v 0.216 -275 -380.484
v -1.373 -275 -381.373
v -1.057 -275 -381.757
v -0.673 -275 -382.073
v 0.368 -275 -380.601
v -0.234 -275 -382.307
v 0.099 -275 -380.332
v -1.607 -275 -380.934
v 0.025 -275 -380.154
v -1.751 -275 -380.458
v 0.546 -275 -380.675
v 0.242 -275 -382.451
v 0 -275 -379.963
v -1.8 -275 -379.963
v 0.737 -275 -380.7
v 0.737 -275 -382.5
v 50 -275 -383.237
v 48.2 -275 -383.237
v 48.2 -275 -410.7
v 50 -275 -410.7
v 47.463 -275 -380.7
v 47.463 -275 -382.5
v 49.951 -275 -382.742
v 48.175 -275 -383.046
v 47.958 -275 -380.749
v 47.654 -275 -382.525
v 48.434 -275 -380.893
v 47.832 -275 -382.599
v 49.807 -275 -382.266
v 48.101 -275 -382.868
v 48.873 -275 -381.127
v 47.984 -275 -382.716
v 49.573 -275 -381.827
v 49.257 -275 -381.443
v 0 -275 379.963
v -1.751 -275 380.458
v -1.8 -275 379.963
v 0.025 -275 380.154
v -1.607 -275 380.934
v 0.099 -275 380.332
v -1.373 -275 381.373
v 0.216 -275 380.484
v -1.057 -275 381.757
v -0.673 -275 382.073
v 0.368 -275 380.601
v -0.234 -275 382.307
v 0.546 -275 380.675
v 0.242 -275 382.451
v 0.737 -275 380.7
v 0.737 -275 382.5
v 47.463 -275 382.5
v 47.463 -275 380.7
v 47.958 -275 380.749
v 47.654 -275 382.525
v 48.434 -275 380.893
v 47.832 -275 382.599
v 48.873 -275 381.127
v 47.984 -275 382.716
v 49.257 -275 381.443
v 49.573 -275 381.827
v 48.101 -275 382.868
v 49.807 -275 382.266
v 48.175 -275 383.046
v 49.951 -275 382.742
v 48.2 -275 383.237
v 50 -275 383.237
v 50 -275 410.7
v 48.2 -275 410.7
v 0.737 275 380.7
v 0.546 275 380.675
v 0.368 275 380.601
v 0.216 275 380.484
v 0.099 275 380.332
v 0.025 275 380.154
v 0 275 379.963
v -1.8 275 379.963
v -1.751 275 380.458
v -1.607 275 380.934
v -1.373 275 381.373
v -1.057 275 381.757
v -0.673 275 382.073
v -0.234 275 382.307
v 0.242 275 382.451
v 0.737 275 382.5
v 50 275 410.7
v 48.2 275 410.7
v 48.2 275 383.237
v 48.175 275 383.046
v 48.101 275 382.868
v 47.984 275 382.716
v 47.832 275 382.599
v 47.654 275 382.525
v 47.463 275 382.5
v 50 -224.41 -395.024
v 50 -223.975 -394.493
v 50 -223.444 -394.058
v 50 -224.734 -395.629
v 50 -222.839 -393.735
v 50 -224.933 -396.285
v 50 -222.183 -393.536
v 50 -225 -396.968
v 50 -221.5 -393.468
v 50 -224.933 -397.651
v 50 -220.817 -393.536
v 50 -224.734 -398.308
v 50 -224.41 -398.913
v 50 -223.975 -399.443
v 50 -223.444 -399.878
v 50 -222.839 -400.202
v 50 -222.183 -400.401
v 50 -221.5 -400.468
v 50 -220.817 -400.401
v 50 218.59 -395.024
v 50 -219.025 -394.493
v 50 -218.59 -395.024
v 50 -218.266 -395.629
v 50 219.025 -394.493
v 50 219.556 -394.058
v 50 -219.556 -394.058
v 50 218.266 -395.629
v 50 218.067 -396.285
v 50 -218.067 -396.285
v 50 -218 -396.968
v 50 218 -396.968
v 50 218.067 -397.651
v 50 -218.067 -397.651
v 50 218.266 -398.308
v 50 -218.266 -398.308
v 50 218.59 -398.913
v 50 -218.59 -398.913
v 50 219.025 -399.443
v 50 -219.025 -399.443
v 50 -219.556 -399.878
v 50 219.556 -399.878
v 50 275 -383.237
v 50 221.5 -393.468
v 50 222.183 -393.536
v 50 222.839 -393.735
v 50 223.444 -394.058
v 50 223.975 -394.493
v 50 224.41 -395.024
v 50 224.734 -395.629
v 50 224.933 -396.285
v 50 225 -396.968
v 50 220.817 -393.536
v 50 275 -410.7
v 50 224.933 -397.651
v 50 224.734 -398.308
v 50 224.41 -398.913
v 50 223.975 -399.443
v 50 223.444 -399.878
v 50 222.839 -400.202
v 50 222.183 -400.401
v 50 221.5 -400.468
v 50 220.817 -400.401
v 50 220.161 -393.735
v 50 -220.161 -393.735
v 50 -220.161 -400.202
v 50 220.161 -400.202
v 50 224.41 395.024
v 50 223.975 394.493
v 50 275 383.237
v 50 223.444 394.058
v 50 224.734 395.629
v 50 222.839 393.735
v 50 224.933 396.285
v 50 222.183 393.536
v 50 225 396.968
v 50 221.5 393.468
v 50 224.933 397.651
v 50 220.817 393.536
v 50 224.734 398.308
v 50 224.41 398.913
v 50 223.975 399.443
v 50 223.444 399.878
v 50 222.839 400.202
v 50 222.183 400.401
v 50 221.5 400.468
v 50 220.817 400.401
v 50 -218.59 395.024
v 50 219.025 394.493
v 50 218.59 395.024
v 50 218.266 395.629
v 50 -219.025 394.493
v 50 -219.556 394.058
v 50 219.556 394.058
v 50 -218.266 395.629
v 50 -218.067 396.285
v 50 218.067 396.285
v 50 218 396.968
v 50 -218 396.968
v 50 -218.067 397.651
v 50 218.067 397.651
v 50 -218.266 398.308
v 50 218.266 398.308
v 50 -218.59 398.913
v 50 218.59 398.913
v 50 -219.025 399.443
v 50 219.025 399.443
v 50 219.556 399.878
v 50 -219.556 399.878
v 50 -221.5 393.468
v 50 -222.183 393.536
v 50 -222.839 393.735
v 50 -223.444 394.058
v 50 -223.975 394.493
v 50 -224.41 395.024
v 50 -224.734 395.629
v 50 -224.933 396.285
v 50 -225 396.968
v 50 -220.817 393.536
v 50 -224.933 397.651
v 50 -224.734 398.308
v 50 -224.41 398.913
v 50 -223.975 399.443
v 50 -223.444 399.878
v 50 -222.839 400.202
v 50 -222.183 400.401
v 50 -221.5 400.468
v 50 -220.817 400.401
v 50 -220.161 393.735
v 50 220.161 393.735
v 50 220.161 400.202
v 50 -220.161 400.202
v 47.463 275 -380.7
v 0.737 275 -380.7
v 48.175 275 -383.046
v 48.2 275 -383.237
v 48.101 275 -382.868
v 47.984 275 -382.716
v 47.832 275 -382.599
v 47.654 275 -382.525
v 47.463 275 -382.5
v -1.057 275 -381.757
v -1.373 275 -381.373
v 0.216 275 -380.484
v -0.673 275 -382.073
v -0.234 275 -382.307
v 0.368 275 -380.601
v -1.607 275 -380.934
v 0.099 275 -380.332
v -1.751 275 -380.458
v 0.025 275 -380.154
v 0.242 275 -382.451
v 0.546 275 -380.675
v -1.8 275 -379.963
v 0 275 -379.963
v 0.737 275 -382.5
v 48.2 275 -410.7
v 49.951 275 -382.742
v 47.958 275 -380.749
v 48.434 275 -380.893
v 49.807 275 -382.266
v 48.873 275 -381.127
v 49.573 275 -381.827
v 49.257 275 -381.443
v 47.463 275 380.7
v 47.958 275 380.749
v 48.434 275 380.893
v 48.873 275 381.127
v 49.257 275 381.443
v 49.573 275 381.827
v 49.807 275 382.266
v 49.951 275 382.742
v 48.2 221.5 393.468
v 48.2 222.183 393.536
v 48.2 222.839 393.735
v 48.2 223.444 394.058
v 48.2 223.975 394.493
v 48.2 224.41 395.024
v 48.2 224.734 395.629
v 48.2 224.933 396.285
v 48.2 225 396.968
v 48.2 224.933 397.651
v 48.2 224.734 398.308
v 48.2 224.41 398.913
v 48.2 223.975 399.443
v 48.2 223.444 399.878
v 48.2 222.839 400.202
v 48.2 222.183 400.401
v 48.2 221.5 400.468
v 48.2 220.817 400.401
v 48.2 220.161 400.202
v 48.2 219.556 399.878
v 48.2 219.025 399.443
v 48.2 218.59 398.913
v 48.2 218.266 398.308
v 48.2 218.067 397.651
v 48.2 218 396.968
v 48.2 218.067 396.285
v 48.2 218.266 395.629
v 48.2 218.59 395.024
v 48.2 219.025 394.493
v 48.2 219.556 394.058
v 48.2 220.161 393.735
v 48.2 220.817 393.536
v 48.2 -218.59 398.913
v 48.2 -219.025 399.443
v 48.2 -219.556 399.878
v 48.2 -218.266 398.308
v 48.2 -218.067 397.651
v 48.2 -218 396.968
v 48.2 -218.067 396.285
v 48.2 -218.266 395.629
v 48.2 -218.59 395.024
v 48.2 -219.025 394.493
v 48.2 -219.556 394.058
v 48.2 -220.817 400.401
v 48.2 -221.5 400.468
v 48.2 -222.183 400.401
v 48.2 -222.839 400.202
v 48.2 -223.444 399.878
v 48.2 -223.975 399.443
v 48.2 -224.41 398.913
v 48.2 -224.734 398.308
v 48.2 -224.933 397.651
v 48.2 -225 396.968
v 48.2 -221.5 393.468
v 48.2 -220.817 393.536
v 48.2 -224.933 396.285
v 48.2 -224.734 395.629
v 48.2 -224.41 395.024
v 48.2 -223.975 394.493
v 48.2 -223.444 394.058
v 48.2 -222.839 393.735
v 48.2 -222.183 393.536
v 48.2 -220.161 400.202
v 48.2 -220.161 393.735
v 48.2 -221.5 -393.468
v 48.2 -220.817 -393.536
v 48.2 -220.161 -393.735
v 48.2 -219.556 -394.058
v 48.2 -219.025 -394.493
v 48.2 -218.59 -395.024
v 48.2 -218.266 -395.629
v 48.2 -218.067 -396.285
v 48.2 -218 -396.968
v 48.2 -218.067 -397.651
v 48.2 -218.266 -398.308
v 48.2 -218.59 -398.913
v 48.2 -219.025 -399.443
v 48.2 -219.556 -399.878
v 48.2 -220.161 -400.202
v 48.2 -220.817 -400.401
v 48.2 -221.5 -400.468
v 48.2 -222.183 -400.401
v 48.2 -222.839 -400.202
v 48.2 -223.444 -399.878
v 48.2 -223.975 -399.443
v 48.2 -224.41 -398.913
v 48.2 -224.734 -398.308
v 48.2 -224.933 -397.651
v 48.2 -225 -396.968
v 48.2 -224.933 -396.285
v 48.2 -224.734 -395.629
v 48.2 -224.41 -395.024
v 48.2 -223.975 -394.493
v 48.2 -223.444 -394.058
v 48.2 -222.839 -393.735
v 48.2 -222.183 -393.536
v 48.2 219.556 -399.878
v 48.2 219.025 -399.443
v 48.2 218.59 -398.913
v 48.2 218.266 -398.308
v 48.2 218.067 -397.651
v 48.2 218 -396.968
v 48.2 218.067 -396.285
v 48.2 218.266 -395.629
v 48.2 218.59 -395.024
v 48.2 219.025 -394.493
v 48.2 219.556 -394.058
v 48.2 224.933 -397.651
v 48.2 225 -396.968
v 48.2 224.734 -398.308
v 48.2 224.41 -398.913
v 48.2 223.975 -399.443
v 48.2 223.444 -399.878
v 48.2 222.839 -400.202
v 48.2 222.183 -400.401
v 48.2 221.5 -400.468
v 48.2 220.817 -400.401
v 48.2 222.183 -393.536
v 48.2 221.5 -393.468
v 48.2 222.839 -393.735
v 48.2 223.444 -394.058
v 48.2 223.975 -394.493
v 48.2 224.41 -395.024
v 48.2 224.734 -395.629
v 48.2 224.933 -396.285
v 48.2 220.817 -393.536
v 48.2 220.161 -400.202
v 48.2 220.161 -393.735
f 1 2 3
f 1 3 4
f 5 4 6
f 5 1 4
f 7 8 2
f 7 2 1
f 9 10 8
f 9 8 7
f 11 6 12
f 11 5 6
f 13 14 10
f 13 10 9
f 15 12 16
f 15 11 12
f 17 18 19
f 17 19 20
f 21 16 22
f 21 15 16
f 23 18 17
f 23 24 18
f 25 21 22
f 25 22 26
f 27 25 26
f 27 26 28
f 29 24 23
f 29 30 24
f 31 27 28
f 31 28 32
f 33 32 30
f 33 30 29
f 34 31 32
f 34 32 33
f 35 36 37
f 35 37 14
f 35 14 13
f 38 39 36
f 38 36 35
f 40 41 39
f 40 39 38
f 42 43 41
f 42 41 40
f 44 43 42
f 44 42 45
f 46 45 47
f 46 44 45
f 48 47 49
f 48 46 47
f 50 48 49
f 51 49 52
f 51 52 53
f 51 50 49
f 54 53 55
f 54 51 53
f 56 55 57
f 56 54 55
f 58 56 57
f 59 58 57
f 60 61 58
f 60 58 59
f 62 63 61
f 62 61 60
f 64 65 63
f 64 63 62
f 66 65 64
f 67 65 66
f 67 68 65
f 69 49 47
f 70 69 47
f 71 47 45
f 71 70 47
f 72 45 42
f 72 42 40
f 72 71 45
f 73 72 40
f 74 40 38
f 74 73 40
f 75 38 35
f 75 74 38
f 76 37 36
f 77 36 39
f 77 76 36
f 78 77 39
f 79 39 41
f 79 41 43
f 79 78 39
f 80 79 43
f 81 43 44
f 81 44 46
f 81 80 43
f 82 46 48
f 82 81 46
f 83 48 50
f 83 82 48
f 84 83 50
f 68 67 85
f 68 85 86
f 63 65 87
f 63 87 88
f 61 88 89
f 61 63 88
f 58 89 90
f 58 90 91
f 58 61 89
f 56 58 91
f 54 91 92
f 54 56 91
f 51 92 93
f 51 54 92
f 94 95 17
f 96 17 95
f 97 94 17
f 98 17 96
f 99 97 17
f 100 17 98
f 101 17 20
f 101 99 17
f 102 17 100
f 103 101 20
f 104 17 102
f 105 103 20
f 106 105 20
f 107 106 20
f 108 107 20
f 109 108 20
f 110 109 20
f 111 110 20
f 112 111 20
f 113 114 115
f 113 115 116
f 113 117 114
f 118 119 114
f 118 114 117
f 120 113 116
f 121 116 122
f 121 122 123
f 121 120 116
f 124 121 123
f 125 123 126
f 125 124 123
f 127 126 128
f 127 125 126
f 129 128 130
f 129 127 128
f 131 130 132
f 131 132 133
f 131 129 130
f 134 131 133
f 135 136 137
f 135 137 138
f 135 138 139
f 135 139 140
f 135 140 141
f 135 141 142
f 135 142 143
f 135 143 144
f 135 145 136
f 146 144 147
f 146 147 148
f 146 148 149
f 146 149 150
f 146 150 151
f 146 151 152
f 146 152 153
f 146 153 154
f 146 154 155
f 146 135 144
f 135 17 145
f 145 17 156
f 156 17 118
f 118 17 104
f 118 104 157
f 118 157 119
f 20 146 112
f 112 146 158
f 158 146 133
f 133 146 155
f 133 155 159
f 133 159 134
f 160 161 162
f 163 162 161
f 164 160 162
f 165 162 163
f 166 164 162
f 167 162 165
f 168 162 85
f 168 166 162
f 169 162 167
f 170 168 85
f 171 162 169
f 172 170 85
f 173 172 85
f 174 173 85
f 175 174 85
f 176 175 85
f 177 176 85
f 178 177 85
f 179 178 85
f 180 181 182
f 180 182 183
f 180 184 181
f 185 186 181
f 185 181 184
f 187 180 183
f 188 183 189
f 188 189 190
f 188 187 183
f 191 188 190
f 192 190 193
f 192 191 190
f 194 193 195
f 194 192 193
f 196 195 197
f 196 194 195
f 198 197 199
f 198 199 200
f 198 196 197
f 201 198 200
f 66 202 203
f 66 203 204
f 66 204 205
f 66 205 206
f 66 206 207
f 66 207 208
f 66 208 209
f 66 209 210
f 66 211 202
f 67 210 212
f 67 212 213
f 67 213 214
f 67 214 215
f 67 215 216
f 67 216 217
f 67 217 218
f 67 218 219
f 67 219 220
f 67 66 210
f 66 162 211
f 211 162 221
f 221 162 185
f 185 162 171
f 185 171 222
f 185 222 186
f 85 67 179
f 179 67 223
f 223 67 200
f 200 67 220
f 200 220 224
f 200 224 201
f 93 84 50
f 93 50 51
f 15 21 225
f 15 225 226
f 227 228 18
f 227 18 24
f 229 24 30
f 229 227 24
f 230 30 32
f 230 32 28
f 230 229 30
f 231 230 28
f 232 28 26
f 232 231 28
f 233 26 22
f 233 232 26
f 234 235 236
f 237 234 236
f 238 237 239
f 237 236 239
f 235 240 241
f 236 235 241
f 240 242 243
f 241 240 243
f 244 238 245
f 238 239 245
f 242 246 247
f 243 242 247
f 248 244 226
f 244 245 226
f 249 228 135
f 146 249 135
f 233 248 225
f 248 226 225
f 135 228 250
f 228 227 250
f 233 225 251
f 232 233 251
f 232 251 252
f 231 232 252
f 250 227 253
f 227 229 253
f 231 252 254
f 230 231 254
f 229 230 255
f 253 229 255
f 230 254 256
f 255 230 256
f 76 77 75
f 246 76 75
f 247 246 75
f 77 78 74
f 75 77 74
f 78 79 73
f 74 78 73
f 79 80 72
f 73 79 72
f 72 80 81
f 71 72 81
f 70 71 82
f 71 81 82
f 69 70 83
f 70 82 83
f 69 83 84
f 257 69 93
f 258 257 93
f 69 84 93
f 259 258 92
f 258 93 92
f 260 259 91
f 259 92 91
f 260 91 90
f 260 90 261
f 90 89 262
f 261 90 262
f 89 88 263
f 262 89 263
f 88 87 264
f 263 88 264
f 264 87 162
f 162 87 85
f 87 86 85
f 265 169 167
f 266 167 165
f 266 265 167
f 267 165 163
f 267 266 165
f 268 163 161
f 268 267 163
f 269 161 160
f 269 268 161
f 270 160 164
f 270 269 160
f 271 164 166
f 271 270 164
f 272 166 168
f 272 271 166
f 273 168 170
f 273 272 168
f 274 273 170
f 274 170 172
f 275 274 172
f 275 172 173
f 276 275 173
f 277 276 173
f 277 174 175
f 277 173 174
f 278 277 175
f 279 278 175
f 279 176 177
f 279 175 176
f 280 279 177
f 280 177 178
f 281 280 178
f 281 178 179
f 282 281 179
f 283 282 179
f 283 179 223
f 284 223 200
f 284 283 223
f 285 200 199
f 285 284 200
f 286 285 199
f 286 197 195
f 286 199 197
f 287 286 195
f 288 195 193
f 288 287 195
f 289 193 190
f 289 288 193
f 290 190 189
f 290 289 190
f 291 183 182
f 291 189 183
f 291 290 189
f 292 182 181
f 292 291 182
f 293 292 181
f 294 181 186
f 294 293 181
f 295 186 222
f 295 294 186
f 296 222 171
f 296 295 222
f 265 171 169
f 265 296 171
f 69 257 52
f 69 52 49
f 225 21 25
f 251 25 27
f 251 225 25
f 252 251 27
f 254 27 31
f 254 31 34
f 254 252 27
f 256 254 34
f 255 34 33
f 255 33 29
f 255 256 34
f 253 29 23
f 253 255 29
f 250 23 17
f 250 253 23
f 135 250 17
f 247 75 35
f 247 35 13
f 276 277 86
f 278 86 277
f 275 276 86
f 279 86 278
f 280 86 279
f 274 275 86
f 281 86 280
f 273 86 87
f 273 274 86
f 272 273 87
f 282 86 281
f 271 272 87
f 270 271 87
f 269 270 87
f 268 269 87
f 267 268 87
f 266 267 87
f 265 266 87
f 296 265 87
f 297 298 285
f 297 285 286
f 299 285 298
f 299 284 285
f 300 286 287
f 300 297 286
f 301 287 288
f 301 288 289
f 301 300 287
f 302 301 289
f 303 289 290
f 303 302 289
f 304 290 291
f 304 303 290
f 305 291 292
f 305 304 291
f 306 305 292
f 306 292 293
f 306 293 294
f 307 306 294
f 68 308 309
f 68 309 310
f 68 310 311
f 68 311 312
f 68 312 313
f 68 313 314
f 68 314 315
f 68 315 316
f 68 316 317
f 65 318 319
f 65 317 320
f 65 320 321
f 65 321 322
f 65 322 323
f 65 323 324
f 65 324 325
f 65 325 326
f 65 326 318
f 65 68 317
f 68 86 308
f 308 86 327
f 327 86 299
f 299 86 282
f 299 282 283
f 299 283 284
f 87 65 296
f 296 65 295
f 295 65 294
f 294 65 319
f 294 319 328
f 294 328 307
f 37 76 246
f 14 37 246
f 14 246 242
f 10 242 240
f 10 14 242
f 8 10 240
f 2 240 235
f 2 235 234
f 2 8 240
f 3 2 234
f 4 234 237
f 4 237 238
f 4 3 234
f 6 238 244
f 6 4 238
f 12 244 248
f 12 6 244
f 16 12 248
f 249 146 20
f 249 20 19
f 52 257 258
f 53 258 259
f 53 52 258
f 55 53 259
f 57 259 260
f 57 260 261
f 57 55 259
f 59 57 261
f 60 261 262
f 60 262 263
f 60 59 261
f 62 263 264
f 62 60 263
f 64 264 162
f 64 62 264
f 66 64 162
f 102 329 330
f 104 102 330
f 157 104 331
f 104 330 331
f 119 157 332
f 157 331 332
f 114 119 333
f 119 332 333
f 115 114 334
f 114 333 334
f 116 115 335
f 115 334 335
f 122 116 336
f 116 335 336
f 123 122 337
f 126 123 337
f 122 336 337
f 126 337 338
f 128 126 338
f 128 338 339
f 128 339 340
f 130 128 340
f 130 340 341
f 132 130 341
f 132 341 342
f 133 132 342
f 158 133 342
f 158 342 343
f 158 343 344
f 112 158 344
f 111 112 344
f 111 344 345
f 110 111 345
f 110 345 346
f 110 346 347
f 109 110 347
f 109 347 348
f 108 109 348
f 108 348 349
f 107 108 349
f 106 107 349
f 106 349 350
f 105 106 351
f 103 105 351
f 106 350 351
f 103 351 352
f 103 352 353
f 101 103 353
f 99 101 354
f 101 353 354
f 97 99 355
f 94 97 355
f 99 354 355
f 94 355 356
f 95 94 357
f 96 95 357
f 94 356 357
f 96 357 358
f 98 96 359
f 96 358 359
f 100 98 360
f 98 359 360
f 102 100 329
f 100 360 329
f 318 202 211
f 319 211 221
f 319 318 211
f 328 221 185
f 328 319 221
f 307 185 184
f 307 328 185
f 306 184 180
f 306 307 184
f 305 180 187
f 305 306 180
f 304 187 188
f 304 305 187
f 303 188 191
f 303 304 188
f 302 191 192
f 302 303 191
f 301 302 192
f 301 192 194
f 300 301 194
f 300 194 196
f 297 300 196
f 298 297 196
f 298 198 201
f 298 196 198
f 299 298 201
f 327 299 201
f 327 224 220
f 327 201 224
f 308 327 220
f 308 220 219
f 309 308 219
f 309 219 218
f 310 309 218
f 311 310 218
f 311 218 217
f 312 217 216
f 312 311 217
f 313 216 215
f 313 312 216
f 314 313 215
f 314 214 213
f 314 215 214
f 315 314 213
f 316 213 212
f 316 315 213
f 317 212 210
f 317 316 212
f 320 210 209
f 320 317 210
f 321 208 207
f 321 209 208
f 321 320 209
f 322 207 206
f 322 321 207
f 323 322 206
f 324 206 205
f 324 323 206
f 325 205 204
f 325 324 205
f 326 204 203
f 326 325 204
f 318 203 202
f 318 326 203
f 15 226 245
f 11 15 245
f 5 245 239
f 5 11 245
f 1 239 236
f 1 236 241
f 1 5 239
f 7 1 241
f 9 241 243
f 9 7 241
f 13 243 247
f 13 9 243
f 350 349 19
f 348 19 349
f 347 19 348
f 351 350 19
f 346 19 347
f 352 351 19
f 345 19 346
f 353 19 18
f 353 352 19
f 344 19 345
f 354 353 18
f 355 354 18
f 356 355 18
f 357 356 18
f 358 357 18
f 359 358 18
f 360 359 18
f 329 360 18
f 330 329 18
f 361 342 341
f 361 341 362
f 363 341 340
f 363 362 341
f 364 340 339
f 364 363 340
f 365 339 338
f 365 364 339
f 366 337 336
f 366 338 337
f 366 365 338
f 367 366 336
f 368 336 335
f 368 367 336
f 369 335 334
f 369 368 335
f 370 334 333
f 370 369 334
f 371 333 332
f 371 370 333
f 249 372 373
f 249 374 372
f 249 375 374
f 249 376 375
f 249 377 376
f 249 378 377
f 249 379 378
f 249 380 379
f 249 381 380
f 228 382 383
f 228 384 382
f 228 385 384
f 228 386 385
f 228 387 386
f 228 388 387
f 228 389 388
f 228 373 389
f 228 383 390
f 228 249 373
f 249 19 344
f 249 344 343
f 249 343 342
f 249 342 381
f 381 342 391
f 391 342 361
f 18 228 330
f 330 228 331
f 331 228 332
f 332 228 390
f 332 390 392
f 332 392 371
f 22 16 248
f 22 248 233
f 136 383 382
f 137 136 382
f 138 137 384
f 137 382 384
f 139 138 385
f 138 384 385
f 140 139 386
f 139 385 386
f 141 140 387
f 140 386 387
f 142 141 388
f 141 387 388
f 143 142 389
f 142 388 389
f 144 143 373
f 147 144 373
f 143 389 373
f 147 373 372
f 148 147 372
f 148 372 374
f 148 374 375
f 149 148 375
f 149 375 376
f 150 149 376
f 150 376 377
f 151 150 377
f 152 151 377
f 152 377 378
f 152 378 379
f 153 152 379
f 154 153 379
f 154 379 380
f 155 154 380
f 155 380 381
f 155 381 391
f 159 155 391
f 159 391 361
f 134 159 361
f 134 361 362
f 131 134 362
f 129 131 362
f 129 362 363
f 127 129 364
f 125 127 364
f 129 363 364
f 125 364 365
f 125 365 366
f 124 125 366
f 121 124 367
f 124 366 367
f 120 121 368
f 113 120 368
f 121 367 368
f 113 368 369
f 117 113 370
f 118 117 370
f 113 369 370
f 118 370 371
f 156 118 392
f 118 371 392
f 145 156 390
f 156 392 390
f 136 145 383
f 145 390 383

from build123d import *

# Parameters (mm, degrees)
SKETCH1_W                      = 765
SKETCH1_H                      = 550
BASE_FLANGE1_DEPTH             = 1.8
EDGE_FLANGE1_STRIP_W           = 8.6732
EDGE_FLANGE1_STRIP_H           = 1.8
EDGE_FLANGE1_STRIP_CUT_DEPTH   = 550
EDGE_FLANGE1_STRIP_2_W         = 8.6732
EDGE_FLANGE1_STRIP_2_H         = 1.8
EDGE_FLANGE1_STRIP_CUT_2_DEPTH = 550
EDGE_FLANGE1_DEPTH             = 550
EDGE_FLANGE1_BEND_DEPTH        = 550
EDGE_FLANGE2_STRIP_W           = 8.6732
EDGE_FLANGE2_STRIP_H           = 1.8
EDGE_FLANGE2_STRIP_CUT_DEPTH   = 550
EDGE_FLANGE2_STRIP_2_W         = 8.6732
EDGE_FLANGE2_STRIP_2_H         = 1.8
EDGE_FLANGE2_STRIP_CUT_2_DEPTH = 550
EDGE_FLANGE2_DEPTH             = 550
EDGE_FLANGE2_BEND_DEPTH        = 550
SKETCH18_R                     = 3.5
CUT_EXTRUDE1_DEPTH             = 10


# Sheet-metal steps are written as plain solids
with BuildPart() as part:
    # Sketch1 → Base-Flange1 (new body)
    with BuildSketch(Plane(origin=(0, 0, 0), x_dir=(0, 0, -1), z_dir=(1, 0, 0))):
        Rectangle(SKETCH1_W, SKETCH1_H)
    extrude(amount=-BASE_FLANGE1_DEPTH)

    # Edge-Flange1 strip (across the edge) → Edge-Flange1 strip cut (cut)
    with BuildSketch(Plane(origin=(0, 275, 382.5), x_dir=(0, 0, -1), z_dir=(0, -1, 0))):
        with Locations((-1.8, -0.9)):
            Rectangle(EDGE_FLANGE1_STRIP_W, EDGE_FLANGE1_STRIP_H)
    extrude(amount=EDGE_FLANGE1_STRIP_CUT_DEPTH, mode=Mode.SUBTRACT)

    # Edge-Flange1 strip 2 (across the edge) → Edge-Flange1 strip cut 2 (cut)
    with BuildSketch(Plane(origin=(0, -275, -382.5), x_dir=(0, 0, 1), z_dir=(0, 1, 0))):
        with Locations((-1.8, -0.9)):
            Rectangle(EDGE_FLANGE1_STRIP_2_W, EDGE_FLANGE1_STRIP_2_H)
    extrude(amount=EDGE_FLANGE1_STRIP_CUT_2_DEPTH, mode=Mode.SUBTRACT)

    # Edge-Flange1 section (across the edge) → Edge-Flange1 (add)
    with BuildSketch(Plane(origin=(0, 275, 382.5), x_dir=(0, 0, -1), z_dir=(0, -1, 0))):
        with BuildLine():
            Line((0, 0.7366), (0, 48.2))
            Line((0, 48.2), (1.8, 48.2))
            Line((1.8, 48.2), (1.8, 0.7366))
            ThreePointArc((1.8, 0.7366), (2.015745145, 0.215745145), (2.5366, 0))
            Line((2.5366, 0), (2.5366, -1.8))
            ThreePointArc((2.5366, -1.8), (0.742952939, -1.057047061), (0, 0.7366))
        make_face()
    extrude(amount=EDGE_FLANGE1_DEPTH)

    # Edge-Flange1 section 2 (across the edge) → Edge-Flange1 bend (add)
    with BuildSketch(Plane(origin=(0, -275, -382.5), x_dir=(0, 0, 1), z_dir=(0, 1, 0))):
        with BuildLine():
            Line((0, 0.7366), (0, 48.2))
            Line((0, 48.2), (1.8, 48.2))
            Line((1.8, 48.2), (1.8, 0.7366))
            ThreePointArc((1.8, 0.7366), (2.015745145, 0.215745145), (2.5366, 0))
            Line((2.5366, 0), (2.5366, -1.8))
            ThreePointArc((2.5366, -1.8), (0.742952939, -1.057047061), (0, 0.7366))
        make_face()
    extrude(amount=EDGE_FLANGE1_BEND_DEPTH)

    # Edge-Flange2 strip (across the edge) → Edge-Flange2 strip cut (cut)
    with BuildSketch(Plane(origin=(48.2, 275, -382.5), x_dir=(-1, 0, 0), z_dir=(0, -1, 0))):
        with Locations((-3.6, -0.9)):
            Rectangle(EDGE_FLANGE2_STRIP_W, EDGE_FLANGE2_STRIP_H)
    extrude(amount=EDGE_FLANGE2_STRIP_CUT_DEPTH, mode=Mode.SUBTRACT)

    # Edge-Flange2 strip 2 (across the edge) → Edge-Flange2 strip cut 2 (cut)
    with BuildSketch(Plane(origin=(48.2, -275, 382.5), x_dir=(-1, 0, 0), z_dir=(0, 1, 0))):
        with Locations((-3.6, -0.9)):
            Rectangle(EDGE_FLANGE2_STRIP_2_W, EDGE_FLANGE2_STRIP_2_H)
    extrude(amount=EDGE_FLANGE2_STRIP_CUT_2_DEPTH, mode=Mode.SUBTRACT)

    # Edge-Flange2 section (across the edge) → Edge-Flange2 (add)
    with BuildSketch(Plane(origin=(48.2, 275, -382.5), x_dir=(-1, 0, 0), z_dir=(0, -1, 0))):
        with BuildLine():
            Line((-1.8, 0.7366), (-1.8, 28.2))
            Line((-1.8, 28.2), (0, 28.2))
            Line((0, 28.2), (0, 0.7366))
            ThreePointArc((0, 0.7366), (0.215745145, 0.215745145), (0.7366, 0))
            Line((0.7366, 0), (0.7366, -1.8))
            ThreePointArc((0.7366, -1.8), (-1.057047061, -1.057047061), (-1.8, 0.7366))
        make_face()
    extrude(amount=EDGE_FLANGE2_DEPTH)

    # Edge-Flange2 section 2 (across the edge) → Edge-Flange2 bend (add)
    with BuildSketch(Plane(origin=(48.2, -275, 382.5), x_dir=(-1, 0, 0), z_dir=(0, 1, 0))):
        with BuildLine():
            Line((-1.8, 0.7366), (-1.8, 28.2))
            Line((-1.8, 28.2), (0, 28.2))
            Line((0, 28.2), (0, 0.7366))
            ThreePointArc((0, 0.7366), (0.215745145, 0.215745145), (0.7366, 0))
            Line((0.7366, 0), (0.7366, -1.8))
            ThreePointArc((0.7366, -1.8), (-1.057047061, -1.057047061), (-1.8, 0.7366))
        make_face()
    extrude(amount=EDGE_FLANGE2_BEND_DEPTH)

    # Sketch18 → Cut-Extrude1 (cut)
    with BuildSketch(Plane.ZY.offset(-48.2)):
        with Locations((-396.9683, 221.5)):
            Circle(SKETCH18_R)
        with Locations((-396.9683, -221.5)):
            Circle(SKETCH18_R)
    cut_extrude1 = extrude(amount=-CUT_EXTRUDE1_DEPTH, mode=Mode.SUBTRACT)

    # Mirror1: Cut-Extrude1 across plane
    add(cut_extrude1.mirror(Plane.XY), mode=Mode.SUBTRACT)


solid = part.part
